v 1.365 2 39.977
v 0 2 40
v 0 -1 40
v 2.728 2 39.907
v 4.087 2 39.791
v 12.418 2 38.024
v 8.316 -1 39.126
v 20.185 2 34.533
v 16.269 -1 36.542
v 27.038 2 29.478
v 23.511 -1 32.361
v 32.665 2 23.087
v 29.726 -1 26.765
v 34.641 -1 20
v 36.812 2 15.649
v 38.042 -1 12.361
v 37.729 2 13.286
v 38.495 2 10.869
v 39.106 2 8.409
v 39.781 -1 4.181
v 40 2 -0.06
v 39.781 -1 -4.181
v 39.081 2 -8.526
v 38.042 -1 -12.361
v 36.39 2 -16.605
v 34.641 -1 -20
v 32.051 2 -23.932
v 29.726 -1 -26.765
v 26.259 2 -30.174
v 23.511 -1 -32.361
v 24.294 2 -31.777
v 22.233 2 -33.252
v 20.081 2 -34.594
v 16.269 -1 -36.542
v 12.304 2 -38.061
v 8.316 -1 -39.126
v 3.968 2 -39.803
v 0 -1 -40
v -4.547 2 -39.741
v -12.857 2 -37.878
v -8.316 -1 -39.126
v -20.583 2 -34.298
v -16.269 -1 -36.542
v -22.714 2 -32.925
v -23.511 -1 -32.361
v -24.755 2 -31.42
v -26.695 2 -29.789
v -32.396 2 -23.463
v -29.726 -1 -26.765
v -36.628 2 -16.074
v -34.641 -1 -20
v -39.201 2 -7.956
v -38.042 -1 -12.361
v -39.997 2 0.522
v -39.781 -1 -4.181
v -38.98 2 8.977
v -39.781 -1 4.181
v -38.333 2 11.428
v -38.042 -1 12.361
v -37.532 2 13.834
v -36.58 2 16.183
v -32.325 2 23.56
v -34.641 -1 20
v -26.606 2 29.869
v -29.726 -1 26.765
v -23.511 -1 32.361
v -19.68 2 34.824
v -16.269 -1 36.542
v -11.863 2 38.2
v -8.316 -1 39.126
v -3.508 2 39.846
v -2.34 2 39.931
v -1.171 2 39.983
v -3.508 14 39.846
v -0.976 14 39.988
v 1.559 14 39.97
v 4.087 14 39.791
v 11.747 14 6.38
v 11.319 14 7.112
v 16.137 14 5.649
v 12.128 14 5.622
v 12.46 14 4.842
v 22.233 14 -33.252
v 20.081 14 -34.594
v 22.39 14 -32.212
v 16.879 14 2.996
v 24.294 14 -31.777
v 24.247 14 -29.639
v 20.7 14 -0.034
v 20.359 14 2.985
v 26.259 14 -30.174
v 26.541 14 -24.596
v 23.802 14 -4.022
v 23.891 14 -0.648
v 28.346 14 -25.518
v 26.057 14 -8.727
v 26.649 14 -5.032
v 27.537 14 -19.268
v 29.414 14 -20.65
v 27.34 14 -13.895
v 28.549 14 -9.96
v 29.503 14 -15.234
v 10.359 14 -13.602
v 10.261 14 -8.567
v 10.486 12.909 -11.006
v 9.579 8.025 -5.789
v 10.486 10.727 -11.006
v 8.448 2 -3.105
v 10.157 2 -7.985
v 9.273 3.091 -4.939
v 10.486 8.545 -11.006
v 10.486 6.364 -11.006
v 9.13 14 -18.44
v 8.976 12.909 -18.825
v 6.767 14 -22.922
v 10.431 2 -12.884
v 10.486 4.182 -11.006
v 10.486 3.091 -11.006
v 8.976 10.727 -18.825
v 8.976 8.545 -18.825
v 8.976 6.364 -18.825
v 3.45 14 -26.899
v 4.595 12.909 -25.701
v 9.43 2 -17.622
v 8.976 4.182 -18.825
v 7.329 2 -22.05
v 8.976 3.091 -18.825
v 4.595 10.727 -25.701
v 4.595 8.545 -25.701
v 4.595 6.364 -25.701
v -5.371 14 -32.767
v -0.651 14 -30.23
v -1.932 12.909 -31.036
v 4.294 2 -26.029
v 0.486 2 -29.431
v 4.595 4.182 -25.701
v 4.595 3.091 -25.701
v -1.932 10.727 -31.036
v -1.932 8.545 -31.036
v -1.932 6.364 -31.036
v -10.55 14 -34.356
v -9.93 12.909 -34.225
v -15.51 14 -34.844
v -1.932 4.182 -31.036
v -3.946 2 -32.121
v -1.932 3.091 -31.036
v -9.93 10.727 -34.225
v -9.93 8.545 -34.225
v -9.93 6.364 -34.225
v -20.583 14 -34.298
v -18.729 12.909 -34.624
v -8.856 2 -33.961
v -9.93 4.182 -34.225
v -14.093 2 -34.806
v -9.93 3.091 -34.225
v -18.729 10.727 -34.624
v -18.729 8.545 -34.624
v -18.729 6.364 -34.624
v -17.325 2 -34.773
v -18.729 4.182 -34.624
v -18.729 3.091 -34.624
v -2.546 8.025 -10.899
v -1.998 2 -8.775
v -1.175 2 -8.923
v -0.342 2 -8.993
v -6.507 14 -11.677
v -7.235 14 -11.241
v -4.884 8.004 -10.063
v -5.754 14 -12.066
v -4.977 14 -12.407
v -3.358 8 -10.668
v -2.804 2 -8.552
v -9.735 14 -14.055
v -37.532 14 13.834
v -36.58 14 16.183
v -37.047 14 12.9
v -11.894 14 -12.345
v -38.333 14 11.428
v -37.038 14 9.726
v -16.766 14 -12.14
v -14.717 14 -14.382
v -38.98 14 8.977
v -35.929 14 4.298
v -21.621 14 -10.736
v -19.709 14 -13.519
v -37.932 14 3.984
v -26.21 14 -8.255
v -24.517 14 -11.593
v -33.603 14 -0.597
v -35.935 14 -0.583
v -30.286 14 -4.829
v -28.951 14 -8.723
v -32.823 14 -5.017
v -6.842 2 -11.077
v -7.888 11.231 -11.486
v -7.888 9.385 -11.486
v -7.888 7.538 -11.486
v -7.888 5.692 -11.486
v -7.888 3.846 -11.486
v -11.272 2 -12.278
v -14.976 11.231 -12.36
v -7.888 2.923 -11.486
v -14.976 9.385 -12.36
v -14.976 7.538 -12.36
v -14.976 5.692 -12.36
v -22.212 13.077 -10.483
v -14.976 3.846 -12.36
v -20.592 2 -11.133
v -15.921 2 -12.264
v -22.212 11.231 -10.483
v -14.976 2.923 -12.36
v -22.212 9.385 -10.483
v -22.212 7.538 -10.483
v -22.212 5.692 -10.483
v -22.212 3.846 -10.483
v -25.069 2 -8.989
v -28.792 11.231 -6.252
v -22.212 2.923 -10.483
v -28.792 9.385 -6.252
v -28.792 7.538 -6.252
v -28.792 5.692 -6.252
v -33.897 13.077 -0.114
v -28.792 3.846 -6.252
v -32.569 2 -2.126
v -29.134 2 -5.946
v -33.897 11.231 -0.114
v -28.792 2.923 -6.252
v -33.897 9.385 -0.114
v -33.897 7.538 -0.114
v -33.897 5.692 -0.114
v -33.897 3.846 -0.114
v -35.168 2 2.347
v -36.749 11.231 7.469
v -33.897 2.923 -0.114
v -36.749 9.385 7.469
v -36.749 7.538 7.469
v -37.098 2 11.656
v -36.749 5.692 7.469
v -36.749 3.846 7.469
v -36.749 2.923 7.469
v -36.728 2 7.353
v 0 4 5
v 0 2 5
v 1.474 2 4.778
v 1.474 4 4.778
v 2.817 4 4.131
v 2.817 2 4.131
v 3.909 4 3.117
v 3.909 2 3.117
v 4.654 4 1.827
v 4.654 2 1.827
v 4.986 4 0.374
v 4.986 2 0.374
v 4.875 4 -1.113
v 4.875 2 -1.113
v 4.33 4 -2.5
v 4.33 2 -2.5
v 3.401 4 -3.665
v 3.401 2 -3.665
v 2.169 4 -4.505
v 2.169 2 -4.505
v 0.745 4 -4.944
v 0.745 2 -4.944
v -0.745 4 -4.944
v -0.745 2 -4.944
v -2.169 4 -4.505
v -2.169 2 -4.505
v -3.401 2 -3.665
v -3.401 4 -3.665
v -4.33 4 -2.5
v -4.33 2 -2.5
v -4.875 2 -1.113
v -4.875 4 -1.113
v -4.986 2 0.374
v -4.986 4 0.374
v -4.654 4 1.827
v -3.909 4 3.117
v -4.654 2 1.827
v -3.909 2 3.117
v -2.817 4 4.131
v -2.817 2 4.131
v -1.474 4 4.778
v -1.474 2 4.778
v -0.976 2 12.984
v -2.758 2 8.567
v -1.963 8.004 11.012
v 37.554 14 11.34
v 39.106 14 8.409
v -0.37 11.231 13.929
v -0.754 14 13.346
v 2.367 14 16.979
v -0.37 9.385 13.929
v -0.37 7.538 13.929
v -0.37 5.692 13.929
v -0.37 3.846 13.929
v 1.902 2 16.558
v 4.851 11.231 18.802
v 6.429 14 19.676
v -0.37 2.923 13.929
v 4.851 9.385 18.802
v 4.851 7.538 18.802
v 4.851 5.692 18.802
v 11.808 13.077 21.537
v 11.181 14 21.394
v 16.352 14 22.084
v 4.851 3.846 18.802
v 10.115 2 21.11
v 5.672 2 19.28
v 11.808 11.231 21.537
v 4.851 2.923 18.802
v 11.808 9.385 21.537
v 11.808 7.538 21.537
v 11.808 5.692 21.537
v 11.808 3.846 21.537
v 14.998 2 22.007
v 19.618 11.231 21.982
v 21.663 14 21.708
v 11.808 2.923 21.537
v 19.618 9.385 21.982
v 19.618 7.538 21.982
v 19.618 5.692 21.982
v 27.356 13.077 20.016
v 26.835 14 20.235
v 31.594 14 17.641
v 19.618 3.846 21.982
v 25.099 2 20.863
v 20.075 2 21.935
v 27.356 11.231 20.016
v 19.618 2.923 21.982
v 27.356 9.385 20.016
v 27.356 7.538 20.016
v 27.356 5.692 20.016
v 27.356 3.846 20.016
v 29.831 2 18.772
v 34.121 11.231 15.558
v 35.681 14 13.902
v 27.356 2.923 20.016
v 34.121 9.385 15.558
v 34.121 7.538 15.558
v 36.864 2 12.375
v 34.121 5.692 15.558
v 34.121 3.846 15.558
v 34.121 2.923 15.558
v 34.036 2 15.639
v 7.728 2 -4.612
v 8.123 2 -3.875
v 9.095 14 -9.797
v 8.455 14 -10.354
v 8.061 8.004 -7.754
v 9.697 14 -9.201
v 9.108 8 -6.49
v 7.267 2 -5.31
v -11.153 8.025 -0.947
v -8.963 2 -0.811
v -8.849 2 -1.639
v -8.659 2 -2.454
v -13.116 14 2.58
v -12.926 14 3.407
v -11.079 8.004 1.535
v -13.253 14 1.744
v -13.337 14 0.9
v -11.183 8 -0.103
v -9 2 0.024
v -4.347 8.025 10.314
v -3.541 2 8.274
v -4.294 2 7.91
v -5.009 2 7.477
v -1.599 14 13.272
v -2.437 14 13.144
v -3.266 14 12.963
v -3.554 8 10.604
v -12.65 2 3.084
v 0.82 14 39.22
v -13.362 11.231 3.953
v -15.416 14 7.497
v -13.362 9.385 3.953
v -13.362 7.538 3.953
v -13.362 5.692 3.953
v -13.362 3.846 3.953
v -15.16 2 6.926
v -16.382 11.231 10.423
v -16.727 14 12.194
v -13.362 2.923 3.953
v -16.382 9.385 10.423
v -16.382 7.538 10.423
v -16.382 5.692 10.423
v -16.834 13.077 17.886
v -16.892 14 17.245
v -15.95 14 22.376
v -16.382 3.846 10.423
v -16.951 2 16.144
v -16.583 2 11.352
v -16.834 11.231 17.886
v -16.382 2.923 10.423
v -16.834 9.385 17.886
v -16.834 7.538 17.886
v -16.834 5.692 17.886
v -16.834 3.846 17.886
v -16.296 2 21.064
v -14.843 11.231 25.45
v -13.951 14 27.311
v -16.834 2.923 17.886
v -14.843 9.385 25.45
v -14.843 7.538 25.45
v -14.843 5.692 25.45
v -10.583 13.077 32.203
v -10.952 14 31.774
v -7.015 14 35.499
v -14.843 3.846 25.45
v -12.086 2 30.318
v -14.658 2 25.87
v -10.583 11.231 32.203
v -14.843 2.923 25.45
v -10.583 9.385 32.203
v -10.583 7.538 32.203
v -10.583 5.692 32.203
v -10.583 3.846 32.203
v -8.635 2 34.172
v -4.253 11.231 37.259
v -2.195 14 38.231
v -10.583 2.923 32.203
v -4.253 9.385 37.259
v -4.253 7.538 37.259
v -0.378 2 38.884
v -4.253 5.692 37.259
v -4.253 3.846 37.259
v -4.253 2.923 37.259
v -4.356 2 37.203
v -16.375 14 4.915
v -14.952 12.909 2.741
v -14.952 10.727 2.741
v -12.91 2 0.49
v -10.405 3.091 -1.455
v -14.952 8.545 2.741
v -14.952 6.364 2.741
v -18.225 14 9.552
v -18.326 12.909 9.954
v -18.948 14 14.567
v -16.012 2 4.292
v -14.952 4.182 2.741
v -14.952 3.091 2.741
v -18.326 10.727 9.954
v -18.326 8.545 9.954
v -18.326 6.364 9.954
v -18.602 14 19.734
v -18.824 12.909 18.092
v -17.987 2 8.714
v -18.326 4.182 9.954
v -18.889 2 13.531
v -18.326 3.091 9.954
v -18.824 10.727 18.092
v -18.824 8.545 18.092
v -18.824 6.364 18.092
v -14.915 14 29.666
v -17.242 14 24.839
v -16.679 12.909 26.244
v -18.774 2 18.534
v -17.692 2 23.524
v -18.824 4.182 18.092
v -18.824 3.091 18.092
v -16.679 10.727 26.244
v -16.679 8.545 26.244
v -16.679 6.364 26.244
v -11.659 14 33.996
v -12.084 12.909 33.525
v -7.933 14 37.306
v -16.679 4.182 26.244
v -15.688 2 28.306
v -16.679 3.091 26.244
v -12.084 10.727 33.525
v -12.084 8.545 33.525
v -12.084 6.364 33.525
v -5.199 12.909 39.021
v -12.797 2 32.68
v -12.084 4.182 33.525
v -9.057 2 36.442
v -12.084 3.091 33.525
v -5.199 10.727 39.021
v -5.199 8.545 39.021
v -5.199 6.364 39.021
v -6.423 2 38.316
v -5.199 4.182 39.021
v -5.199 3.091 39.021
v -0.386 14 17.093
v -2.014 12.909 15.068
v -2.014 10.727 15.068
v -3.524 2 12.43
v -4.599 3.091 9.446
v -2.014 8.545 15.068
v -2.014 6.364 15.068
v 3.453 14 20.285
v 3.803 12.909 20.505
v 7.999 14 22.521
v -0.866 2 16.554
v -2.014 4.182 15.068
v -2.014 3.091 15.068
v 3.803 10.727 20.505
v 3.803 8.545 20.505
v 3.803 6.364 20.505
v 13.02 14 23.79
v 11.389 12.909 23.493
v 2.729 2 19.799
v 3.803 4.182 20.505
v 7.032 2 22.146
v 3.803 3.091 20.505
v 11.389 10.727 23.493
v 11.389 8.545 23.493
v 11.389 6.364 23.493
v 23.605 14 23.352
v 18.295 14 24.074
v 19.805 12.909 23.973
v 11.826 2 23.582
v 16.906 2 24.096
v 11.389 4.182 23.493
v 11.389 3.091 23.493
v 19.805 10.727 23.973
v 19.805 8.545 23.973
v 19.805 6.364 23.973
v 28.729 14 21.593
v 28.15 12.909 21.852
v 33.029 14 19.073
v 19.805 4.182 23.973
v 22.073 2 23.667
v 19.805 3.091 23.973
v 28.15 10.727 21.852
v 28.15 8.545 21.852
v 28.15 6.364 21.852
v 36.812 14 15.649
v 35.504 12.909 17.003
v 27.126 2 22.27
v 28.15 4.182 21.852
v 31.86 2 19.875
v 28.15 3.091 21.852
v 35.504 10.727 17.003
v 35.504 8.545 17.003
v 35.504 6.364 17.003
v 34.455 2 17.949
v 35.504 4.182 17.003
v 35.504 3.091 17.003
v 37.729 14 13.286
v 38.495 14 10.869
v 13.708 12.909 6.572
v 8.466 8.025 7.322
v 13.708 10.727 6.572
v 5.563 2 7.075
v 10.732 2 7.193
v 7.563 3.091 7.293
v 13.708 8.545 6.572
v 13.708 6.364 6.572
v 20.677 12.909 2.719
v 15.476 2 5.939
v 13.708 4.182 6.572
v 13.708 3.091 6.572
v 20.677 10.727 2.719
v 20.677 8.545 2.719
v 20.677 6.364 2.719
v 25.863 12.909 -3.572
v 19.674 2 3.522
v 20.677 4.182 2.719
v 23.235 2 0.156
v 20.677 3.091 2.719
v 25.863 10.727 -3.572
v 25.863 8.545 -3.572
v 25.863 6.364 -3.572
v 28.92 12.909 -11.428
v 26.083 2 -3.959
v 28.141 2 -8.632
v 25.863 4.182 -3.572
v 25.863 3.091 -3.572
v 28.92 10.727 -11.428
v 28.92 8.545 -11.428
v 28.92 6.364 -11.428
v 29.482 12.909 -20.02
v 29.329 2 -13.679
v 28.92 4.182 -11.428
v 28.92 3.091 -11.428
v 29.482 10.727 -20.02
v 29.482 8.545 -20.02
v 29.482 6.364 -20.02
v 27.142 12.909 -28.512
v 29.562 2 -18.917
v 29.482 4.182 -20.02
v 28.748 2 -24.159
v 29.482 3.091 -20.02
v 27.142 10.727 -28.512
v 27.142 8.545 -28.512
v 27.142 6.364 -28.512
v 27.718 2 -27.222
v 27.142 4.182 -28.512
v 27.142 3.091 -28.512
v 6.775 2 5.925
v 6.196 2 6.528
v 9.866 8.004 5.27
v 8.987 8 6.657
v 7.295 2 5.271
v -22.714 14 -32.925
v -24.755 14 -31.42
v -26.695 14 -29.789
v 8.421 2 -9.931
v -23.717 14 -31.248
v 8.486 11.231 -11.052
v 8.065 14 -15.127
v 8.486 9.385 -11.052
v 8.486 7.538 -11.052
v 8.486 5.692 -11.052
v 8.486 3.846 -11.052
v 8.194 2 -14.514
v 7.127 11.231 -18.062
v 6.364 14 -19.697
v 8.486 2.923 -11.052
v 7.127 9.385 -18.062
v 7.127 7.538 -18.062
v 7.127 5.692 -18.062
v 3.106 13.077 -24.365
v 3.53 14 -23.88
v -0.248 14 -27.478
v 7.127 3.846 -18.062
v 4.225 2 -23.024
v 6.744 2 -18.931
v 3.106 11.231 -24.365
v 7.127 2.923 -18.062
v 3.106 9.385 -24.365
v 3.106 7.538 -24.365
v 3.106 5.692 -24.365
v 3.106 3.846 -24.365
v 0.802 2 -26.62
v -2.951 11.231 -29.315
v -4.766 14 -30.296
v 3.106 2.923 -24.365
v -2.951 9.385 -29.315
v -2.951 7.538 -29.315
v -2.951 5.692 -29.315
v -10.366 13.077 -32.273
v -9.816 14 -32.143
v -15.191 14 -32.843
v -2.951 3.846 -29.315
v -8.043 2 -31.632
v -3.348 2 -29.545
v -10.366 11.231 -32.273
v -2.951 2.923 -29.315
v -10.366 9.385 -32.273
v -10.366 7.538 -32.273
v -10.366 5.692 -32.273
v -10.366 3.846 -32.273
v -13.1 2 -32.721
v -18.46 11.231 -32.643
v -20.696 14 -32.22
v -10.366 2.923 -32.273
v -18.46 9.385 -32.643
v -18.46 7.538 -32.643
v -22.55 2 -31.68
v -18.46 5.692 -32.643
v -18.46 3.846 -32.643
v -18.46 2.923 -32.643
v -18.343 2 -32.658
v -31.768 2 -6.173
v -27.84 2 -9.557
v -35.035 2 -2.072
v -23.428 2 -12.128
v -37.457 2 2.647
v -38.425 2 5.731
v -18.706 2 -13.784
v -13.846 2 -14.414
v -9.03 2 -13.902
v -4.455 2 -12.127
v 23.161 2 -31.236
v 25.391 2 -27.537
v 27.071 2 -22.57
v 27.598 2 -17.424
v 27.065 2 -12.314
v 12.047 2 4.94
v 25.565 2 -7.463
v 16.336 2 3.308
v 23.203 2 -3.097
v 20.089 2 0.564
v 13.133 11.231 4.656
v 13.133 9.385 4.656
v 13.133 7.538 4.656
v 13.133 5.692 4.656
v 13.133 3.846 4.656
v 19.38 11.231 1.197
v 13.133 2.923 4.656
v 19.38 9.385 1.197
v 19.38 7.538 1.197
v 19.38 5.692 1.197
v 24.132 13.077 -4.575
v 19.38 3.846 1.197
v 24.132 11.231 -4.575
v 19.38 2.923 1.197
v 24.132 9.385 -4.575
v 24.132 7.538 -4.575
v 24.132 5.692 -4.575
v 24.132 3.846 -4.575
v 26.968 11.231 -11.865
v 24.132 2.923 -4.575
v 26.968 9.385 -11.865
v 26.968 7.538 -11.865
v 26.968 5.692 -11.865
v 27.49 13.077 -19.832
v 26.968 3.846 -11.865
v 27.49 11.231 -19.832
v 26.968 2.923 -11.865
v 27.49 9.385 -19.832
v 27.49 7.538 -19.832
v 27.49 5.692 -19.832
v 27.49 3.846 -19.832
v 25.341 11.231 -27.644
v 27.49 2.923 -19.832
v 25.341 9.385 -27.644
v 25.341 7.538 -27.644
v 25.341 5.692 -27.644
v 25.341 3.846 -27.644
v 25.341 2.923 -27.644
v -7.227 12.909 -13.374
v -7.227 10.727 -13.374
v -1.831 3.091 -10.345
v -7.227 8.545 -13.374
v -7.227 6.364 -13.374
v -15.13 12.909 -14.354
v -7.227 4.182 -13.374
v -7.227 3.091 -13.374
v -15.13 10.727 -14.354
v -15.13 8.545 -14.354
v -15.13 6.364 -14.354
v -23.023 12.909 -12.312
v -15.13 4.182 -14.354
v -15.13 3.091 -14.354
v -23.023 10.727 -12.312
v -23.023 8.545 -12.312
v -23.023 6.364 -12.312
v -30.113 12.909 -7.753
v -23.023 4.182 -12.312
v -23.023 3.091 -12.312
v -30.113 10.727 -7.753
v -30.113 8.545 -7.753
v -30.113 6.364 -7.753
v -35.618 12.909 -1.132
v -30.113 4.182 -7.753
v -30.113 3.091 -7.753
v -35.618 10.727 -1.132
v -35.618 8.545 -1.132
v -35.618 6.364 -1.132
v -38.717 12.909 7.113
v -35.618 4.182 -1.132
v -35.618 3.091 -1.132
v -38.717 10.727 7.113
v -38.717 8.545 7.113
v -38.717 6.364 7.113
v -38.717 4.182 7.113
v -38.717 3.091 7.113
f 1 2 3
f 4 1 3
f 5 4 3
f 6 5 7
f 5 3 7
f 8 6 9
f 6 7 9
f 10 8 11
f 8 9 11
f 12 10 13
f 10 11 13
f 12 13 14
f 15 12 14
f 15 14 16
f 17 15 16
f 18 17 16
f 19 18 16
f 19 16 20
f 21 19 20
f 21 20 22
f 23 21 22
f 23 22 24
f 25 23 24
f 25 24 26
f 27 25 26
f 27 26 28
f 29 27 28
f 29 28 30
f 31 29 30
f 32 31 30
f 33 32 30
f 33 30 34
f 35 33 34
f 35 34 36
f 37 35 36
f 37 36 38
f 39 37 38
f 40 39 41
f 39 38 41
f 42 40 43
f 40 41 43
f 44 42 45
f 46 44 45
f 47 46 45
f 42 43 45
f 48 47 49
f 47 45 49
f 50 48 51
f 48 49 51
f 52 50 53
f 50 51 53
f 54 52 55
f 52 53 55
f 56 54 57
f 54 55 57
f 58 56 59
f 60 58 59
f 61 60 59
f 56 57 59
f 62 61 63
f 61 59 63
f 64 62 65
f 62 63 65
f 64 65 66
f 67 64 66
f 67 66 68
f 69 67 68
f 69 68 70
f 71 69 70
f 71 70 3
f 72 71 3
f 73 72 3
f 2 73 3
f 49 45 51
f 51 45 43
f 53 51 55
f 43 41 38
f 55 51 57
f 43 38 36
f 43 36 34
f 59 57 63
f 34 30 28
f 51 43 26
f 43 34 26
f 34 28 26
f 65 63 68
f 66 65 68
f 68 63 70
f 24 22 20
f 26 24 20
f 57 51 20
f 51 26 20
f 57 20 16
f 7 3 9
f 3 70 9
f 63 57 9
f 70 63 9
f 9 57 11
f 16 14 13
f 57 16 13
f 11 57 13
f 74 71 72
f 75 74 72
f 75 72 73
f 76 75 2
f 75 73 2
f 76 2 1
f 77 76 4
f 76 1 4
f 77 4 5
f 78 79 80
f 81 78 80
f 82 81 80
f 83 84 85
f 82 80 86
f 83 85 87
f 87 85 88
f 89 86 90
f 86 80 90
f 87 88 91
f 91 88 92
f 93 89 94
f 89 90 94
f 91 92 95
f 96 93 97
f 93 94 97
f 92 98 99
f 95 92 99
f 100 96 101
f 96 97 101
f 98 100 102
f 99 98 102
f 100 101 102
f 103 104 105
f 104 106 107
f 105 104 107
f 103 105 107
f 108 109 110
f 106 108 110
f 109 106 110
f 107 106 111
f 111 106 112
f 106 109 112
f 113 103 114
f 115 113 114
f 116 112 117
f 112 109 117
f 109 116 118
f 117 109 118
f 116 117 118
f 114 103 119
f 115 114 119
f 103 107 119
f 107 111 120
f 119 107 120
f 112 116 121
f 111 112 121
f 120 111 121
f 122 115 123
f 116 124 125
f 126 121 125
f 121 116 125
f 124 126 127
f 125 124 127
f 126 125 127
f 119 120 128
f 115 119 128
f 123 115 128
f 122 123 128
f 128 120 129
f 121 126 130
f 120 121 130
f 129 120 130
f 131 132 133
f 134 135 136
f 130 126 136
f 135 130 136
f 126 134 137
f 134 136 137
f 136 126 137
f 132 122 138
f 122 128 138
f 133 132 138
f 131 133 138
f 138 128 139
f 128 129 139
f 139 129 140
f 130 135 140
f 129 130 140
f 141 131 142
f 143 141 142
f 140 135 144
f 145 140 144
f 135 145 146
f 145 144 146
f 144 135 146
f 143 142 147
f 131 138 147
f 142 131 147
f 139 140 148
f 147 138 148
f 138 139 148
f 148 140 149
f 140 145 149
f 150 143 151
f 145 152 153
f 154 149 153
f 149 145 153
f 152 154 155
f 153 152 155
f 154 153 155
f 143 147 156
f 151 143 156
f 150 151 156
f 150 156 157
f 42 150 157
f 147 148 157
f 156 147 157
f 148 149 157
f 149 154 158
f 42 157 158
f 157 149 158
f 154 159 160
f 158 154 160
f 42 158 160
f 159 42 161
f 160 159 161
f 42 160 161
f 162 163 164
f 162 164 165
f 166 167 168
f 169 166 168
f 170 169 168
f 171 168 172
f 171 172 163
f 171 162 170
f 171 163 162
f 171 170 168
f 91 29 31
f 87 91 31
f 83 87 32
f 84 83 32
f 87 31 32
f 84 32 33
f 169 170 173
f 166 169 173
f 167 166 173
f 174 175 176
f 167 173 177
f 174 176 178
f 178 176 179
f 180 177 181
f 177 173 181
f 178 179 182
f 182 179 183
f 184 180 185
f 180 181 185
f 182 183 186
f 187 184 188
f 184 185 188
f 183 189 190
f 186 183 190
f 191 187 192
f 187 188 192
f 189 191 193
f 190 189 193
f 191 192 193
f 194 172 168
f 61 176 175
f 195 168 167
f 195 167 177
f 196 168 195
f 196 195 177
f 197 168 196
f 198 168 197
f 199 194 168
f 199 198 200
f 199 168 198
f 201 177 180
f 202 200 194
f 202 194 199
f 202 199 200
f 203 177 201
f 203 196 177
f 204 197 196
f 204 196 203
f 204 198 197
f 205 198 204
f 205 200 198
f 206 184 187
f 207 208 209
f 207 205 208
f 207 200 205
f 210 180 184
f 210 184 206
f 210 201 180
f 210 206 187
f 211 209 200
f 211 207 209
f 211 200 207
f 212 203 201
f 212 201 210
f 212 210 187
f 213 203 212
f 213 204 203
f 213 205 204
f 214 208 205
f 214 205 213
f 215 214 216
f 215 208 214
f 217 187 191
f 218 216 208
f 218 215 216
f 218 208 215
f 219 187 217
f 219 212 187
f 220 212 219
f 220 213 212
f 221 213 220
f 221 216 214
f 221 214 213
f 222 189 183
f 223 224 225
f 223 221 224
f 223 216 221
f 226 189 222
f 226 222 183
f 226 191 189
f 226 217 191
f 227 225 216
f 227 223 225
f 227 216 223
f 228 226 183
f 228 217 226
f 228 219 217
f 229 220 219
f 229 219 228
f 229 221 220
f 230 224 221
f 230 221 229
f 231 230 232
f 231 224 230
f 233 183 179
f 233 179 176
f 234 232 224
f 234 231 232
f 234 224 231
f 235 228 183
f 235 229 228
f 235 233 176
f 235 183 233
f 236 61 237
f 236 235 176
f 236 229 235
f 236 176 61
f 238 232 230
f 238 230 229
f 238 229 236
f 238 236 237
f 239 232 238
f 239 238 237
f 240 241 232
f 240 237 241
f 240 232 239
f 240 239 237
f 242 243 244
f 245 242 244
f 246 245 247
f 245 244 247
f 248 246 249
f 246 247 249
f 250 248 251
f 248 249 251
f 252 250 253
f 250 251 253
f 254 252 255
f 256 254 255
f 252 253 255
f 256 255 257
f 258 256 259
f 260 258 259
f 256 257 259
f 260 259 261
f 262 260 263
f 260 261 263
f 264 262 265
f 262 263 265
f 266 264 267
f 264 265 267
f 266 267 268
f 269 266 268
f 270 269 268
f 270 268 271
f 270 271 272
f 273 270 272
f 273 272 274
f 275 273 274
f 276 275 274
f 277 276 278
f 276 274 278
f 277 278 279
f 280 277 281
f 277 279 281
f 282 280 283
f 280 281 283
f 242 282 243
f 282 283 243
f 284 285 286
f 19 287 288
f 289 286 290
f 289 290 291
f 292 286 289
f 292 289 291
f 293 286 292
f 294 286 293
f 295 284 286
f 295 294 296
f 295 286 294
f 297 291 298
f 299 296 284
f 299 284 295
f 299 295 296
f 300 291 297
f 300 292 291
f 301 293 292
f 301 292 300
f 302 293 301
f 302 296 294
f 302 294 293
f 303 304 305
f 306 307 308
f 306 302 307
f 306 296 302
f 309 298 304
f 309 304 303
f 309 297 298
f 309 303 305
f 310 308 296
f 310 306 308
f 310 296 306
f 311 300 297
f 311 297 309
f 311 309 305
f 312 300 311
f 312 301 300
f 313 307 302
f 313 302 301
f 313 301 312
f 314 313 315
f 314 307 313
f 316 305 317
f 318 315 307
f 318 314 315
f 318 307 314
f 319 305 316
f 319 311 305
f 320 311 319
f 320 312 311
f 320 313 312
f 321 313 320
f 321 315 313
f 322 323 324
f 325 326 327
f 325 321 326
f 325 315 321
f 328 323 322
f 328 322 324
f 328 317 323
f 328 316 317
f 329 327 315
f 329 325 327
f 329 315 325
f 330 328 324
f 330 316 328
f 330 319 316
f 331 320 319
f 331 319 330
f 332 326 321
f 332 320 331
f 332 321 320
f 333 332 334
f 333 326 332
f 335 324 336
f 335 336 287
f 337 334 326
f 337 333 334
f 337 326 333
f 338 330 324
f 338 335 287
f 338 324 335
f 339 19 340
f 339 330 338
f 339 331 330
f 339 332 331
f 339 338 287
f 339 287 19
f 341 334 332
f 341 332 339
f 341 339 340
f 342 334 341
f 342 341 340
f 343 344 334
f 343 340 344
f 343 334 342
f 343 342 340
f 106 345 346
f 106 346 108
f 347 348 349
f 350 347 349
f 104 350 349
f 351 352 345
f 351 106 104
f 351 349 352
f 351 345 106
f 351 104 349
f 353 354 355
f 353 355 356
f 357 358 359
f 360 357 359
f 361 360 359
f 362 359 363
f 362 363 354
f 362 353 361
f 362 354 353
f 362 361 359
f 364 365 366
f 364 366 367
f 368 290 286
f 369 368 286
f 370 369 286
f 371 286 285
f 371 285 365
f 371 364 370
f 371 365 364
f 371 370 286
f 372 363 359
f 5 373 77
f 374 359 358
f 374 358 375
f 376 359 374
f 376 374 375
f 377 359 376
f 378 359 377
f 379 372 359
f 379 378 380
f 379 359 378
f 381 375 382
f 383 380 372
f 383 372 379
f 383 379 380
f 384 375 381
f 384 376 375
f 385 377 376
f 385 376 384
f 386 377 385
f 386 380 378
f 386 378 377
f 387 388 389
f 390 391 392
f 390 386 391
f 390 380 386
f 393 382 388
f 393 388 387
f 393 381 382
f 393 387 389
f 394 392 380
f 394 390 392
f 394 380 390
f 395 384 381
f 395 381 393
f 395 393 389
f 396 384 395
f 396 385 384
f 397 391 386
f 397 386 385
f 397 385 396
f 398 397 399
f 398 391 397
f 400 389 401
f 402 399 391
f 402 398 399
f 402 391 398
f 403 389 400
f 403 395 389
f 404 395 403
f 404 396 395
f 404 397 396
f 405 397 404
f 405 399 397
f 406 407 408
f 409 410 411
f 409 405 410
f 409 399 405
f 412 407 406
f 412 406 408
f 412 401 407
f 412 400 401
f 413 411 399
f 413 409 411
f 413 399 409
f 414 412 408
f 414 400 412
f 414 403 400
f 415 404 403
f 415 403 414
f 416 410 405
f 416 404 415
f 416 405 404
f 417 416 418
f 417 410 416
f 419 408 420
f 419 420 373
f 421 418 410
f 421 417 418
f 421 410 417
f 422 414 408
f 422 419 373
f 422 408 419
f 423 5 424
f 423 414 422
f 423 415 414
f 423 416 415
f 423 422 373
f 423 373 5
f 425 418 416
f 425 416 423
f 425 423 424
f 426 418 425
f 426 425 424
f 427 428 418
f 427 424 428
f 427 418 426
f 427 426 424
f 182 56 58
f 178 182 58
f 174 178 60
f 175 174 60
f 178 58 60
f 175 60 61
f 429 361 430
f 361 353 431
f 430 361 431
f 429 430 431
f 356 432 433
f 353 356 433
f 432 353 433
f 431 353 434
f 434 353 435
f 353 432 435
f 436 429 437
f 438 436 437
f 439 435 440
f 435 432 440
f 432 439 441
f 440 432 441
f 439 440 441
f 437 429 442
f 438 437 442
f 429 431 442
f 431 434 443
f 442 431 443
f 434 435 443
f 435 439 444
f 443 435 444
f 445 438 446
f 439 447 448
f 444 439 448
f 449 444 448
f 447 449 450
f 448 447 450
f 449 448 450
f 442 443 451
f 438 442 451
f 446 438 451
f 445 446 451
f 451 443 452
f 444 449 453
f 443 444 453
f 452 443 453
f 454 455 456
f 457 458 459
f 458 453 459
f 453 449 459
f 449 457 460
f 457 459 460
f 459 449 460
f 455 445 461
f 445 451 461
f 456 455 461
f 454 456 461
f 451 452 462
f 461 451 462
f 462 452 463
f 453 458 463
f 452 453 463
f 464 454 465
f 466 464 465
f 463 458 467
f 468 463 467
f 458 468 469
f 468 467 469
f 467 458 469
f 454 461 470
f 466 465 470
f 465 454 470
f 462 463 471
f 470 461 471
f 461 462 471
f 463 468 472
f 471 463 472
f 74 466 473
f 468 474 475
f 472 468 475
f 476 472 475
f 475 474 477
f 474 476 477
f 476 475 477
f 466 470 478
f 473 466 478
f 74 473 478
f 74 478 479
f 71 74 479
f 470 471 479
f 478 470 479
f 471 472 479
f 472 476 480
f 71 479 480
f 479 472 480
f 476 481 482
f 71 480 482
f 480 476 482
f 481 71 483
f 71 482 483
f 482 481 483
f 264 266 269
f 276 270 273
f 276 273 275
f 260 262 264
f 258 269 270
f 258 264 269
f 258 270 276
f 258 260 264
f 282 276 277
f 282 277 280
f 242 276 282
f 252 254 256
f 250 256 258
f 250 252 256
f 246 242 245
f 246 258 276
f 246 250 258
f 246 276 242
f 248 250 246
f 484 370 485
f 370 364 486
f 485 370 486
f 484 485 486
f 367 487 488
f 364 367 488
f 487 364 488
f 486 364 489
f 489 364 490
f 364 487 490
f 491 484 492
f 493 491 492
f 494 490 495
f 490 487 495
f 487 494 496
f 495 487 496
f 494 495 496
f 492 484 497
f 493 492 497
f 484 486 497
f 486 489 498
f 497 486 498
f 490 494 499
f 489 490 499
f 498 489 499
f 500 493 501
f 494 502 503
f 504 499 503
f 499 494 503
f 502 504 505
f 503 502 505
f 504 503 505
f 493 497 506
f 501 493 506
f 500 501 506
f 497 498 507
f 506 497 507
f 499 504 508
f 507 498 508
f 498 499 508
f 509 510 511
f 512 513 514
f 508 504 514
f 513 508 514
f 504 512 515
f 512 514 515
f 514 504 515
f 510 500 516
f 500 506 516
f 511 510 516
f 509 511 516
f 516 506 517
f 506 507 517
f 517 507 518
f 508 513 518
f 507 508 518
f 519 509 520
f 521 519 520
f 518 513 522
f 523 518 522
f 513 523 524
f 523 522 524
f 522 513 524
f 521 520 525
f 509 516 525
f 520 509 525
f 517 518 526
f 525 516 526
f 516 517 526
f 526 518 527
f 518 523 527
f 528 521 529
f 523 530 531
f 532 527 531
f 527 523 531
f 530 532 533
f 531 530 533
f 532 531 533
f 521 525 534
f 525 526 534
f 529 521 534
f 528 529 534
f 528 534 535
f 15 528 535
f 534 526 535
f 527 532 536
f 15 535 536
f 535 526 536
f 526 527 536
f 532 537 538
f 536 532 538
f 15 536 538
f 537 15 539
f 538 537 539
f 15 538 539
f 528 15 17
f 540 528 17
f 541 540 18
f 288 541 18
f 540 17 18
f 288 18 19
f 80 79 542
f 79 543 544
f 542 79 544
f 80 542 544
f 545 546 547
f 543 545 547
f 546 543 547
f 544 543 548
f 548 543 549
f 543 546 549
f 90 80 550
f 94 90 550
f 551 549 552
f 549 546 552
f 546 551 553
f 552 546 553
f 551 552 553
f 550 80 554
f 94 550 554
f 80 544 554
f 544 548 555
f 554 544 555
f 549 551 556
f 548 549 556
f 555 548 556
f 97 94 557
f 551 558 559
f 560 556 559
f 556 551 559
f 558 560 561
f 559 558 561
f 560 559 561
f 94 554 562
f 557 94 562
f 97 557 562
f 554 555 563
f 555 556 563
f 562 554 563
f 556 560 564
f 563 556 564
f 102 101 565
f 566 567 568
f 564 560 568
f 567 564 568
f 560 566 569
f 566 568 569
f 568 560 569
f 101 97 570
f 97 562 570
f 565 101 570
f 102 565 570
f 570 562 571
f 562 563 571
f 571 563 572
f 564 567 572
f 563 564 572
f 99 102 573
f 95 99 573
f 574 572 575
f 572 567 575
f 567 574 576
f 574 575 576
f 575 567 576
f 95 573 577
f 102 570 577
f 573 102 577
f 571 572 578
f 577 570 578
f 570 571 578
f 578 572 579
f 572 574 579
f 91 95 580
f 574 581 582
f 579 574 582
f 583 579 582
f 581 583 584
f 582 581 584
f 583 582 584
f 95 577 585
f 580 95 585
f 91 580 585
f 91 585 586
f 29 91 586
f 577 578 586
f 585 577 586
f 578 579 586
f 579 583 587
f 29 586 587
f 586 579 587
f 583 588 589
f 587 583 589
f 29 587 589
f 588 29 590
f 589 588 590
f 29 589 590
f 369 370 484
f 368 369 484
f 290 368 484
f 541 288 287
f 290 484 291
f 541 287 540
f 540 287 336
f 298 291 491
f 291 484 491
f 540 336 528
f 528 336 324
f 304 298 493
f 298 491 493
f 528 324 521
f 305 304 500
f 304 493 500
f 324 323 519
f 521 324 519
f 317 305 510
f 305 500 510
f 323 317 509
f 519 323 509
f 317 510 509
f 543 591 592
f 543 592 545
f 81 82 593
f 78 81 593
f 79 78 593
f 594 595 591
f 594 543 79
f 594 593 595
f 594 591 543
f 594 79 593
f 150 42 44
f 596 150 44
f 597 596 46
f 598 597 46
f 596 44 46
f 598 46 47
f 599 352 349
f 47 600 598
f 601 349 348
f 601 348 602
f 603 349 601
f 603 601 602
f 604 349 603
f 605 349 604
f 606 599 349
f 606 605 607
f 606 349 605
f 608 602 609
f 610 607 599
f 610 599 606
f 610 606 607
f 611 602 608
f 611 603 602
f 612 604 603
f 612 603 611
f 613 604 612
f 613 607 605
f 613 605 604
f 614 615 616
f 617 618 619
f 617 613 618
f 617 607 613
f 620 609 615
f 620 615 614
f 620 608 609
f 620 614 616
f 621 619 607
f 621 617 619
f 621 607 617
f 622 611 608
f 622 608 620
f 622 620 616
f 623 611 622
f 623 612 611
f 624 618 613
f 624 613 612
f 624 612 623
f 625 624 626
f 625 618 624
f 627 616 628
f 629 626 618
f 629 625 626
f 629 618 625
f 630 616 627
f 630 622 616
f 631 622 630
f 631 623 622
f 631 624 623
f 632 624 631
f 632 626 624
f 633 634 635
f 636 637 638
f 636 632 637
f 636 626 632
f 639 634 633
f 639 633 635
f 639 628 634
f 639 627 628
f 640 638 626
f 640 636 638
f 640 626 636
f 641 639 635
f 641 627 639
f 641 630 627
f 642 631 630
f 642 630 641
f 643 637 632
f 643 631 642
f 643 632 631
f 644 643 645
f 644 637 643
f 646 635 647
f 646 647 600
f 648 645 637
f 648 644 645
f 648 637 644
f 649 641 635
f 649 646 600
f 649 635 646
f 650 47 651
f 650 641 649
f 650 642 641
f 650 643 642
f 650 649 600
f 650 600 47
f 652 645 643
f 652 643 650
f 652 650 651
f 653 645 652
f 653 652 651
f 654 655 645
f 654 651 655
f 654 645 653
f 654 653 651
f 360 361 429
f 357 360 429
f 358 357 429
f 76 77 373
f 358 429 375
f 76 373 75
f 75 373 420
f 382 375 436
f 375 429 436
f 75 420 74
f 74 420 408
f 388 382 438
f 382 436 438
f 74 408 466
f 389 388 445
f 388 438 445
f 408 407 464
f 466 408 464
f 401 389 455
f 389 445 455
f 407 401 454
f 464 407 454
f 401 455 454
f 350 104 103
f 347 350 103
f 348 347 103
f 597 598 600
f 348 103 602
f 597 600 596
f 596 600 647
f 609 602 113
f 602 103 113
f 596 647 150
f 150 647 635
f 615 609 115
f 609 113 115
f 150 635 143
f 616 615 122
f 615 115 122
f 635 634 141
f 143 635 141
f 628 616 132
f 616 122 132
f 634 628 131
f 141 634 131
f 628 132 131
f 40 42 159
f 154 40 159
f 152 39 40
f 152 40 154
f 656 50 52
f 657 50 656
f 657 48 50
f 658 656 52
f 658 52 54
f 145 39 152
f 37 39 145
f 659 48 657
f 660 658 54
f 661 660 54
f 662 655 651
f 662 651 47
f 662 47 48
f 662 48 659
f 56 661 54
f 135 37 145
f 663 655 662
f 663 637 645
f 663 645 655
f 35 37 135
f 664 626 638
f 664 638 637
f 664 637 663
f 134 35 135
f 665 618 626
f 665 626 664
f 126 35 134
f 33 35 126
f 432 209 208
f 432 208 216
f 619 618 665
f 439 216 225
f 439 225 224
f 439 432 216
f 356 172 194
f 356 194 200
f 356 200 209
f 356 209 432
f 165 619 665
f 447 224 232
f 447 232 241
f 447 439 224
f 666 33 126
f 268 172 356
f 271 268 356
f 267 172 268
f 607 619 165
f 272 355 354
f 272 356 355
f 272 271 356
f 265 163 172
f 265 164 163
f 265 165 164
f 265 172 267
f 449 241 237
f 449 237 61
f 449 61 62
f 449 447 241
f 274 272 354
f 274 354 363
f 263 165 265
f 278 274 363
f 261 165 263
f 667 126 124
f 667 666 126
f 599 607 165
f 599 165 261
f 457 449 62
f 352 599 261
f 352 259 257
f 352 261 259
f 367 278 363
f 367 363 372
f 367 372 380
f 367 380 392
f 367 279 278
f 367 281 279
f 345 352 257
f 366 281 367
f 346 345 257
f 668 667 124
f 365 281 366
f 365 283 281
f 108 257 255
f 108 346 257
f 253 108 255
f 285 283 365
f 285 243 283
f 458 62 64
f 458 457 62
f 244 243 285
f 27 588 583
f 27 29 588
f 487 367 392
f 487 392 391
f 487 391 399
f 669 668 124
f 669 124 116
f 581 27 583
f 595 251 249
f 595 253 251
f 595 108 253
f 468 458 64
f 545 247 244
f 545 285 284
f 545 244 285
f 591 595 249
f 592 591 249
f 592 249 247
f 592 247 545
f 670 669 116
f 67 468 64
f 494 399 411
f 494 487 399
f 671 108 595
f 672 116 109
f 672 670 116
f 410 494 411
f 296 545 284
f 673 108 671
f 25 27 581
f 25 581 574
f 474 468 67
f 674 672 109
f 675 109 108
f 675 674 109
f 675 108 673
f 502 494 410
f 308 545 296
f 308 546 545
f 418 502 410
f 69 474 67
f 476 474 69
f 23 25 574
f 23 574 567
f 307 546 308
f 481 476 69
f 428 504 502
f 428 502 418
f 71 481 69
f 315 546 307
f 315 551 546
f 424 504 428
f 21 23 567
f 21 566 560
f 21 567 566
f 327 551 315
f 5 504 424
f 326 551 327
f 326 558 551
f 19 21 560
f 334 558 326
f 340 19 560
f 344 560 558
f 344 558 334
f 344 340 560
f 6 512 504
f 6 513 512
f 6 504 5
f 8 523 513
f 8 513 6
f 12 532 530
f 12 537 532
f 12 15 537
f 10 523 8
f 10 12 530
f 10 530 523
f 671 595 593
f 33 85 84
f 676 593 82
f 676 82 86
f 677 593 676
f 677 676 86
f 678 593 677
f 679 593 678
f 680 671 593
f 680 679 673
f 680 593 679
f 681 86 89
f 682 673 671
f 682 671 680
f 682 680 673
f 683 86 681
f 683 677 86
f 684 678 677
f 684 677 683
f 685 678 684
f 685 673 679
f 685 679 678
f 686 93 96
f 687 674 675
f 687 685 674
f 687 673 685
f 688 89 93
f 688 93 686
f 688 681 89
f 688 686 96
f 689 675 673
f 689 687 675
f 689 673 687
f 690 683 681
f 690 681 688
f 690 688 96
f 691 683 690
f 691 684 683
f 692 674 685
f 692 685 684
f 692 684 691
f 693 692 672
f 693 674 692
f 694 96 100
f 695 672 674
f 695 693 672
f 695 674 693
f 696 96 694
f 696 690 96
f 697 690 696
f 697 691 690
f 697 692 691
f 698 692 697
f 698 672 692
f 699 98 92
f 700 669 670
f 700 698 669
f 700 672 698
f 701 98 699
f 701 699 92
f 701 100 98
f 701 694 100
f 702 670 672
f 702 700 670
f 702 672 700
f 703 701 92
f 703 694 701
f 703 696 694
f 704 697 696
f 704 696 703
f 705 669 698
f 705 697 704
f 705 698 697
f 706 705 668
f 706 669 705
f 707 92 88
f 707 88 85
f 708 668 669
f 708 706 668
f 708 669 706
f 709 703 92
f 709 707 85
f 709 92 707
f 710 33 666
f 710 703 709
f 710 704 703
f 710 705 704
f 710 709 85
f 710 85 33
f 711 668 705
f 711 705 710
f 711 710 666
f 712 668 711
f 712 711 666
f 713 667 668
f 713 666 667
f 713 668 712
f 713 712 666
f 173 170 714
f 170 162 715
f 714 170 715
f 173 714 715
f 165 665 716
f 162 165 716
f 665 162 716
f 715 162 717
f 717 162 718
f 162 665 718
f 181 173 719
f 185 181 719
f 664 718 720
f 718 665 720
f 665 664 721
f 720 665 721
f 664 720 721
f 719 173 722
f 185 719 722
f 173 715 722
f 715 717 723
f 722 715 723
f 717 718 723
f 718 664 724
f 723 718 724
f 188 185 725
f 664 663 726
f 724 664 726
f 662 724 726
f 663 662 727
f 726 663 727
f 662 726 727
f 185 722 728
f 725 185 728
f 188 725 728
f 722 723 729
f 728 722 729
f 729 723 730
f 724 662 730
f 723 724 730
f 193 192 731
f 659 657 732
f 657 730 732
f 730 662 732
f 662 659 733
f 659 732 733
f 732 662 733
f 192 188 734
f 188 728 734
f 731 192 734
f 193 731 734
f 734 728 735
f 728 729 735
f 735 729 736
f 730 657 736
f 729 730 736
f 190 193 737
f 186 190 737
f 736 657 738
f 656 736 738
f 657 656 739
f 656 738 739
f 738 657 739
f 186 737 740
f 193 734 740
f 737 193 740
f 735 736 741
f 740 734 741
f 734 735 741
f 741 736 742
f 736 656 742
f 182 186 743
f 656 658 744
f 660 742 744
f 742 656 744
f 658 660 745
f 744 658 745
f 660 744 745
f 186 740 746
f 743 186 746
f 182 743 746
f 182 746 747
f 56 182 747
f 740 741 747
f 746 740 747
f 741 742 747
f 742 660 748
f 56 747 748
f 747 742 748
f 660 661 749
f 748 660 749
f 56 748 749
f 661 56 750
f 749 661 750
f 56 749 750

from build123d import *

# Parameters (mm, degrees)
BOSS_EXTRUDE1_DEPTH      = 2
BOSS_EXTRUDE1_DEPTH_BACK = 1
SKETCH1_R                = 40
BOSS_EXTRUDE2_DEPTH      = 12
CIRPATTERN1_COUNT        = 5
SKETCH4_R                = 5
BOSS_EXTRUDE3_DEPTH      = 2


with BuildPart() as part:
    # Sketch1 → Boss-Extrude1 (new, two sides: drawn at the far end of the back side and taken through both)
    with BuildSketch(Plane(origin=(0, 0, 0), x_dir=(1, 0, 0), z_dir=(0, 1, 0)).offset(-BOSS_EXTRUDE1_DEPTH_BACK)):
        Circle(SKETCH1_R)
    extrude(amount=BOSS_EXTRUDE1_DEPTH + BOSS_EXTRUDE1_DEPTH_BACK)

    # Sketch2 → Boss-Extrude2 (add)
    with BuildSketch(Plane(origin=(0, 2, 0), x_dir=(1, 0, 0), z_dir=(0, 1, 0))):
        with BuildLine():
            add(Edge.make_bspline(
                [(-1.648457537, 7.469358199), (-2.104873805, 7.937868262), (-3.086385024, 8.83695283), (-5.118879824, 10.300544164), (-7.85339222, 11.617216343), (-11.343679645, 12.411124094), (-16.177419051, 12.495643266), (-22.32154029, 10.877489917), (-29.038746805, 6.570733882), (-33.401405456, 1.389922557), (-35.761319101, -3.474155864), (-36.874262221, -7.426752725), (-37.238472583, -11.634394908), (-36.915436622, -14.613747914), (-36.587236294, -16.149943806), (-36.580010635, -16.183411937)],
                knots=[0, 0, 0, 0, 0.03125, 0.0625, 0.125, 0.1875, 0.25, 0.375, 0.5, 0.625, 0.6875, 0.75, 0.8125, 0.875, 0.876391371, 0.876391371, 0.876391371, 0.876391371], degree=3))
            Line((-1.648457537, 7.469358199), (-0.215875004, 8.864961038))
            add(Edge.make_bspline(
                [(-0.215875004, 8.864961038), (-0.725572372, 9.388164005), (-1.819134041, 10.389961885), (-4.104895535, 12.036976258), (-7.191277155, 13.522686378), (-11.109594838, 14.411975027), (-16.471086792, 14.501770787), (-23.156943321, 12.729175608), (-30.376376148, 8.096753493), (-35.077876345, 2.519665418), (-37.639776615, -2.757260327), (-38.616179028, -6.222859697), (-38.916318413, -8.348122546), (-38.979627679, -8.9771168)],
                knots=[0, 0, 0, 0, 0.03125, 0.0625, 0.125, 0.1875, 0.25, 0.375, 0.5, 0.625, 0.6875, 0.75, 0.775839178, 0.775839178, 0.775839178, 0.775839178], degree=3))
            ThreePointArc((-38.979627679, -8.9771168), (-37.951250413, -12.637349092), (-36.580010635, -16.183411937))
        make_face()
    boss_extrude2 = extrude(amount=BOSS_EXTRUDE2_DEPTH)

    # CirPattern1: Boss-Extrude2 ×5 about axis
    cirpattern1_axis = Axis((0, 2, 0), (0, 1, 0))
    for i in range(1, CIRPATTERN1_COUNT):
        add(boss_extrude2.rotate(cirpattern1_axis, i * 360 / CIRPATTERN1_COUNT))

    # Sketch3 → Cut-Revolve1 (revolve, cut)
    with BuildSketch(Plane.XY):
        Polygon((0, 2), (-9, 2), (-13.731613045, 15), (0, 15), align=None)
    revolve(axis=Axis((0, 15, 0), (0, -1, 0)), mode=Mode.SUBTRACT)

    # Sketch4 → Boss-Extrude3 (add)
    with BuildSketch(Plane(origin=(0, 2, 0), x_dir=(1, 0, 0), z_dir=(0, 1, 0))):
        Circle(SKETCH4_R)
    extrude(amount=BOSS_EXTRUDE3_DEPTH)


solid = part.part
